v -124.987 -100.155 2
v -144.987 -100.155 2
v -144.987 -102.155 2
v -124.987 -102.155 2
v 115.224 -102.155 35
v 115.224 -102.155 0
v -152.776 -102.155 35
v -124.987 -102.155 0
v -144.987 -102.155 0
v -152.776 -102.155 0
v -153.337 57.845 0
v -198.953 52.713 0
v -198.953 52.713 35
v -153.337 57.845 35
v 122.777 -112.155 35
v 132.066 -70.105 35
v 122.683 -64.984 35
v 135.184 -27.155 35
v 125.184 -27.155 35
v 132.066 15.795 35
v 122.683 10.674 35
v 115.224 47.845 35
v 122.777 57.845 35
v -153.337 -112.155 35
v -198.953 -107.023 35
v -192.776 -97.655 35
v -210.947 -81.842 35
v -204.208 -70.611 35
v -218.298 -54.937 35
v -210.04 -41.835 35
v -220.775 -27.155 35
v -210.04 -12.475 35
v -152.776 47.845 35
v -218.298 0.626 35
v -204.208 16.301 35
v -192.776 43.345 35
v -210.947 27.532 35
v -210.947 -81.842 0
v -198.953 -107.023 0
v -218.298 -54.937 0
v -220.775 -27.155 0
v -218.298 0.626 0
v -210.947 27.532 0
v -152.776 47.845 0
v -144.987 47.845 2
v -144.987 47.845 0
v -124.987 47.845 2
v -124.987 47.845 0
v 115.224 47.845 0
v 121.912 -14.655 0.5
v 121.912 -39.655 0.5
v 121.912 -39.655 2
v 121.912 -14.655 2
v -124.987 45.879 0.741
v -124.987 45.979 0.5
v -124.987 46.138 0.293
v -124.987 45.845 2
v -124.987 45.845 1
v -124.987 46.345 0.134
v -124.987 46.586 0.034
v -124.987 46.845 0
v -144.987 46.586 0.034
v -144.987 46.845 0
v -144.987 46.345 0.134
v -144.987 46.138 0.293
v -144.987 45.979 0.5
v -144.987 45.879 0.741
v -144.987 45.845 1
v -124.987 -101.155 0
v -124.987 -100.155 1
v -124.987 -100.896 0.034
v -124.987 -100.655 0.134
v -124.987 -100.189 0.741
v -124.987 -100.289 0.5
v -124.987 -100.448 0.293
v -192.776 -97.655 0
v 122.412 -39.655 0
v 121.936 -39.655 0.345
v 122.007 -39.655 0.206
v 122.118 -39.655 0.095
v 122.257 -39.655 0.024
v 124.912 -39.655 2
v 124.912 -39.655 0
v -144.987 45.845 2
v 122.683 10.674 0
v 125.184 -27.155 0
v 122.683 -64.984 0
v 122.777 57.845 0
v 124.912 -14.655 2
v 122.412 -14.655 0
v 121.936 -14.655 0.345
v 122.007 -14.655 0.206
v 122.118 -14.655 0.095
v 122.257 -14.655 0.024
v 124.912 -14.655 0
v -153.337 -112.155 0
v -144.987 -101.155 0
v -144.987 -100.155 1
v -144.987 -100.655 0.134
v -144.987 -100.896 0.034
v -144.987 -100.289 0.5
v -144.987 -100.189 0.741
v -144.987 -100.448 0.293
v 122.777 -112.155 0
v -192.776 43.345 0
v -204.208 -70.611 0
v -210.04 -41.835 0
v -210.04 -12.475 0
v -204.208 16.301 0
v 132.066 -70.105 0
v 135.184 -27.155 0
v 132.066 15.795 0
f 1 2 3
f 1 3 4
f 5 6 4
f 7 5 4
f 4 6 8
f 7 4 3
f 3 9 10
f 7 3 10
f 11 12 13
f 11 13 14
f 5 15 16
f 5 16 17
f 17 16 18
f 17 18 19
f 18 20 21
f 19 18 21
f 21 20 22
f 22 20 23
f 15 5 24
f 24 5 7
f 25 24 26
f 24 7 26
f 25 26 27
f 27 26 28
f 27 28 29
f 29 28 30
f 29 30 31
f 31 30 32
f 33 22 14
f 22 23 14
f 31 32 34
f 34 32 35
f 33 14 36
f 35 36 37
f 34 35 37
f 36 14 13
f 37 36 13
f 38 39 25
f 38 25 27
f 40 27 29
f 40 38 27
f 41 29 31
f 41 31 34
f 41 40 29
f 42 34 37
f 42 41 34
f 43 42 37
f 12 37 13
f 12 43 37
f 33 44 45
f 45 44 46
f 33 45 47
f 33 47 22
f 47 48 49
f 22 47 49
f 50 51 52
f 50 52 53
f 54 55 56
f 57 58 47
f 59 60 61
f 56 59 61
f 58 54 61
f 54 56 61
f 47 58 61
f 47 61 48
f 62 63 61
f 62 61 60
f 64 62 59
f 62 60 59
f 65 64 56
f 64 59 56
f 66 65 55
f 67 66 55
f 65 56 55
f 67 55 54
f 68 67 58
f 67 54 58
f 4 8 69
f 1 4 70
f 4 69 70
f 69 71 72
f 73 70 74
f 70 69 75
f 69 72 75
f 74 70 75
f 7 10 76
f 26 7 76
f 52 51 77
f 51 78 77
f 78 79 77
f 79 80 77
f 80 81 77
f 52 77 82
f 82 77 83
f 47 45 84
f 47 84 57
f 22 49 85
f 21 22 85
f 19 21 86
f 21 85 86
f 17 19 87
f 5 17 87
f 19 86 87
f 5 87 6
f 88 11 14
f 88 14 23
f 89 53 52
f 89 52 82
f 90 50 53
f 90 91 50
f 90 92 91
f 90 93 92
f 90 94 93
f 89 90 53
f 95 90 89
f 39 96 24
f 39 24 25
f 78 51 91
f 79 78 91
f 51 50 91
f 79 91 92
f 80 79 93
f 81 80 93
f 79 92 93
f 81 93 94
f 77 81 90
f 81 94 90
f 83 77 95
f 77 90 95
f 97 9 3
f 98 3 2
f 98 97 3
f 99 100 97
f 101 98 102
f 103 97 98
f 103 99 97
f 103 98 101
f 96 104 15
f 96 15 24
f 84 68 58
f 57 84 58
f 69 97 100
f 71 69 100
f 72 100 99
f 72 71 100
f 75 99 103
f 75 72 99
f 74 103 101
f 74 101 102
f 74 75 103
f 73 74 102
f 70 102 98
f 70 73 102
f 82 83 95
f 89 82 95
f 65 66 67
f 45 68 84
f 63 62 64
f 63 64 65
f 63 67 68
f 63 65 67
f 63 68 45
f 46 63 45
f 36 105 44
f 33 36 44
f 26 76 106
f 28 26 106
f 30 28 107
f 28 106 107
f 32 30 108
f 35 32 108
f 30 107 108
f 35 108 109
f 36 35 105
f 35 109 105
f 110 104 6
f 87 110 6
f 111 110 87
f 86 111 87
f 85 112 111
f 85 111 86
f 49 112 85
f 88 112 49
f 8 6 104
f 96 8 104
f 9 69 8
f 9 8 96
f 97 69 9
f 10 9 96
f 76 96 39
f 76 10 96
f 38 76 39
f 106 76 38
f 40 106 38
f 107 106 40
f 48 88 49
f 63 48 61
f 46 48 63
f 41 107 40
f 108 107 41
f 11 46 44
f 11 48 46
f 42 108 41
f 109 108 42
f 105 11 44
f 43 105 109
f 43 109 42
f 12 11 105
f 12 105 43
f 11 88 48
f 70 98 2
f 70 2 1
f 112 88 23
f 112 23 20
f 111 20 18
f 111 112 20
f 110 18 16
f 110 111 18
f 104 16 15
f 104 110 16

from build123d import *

# Parameters (mm, degrees)
EXTRU_MINCE1_DEPTH = 35
ESQUISSE1_13_W     = 3
ESQUISSE1_13_H     = 25
BOSS_EXTRU_1_DEPTH = 2
ESQUISSE1_14_W     = 20
ESQUISSE1_14_H     = 2
BOSS_EXTRU_2_DEPTH = 2
ESQUISSE1_15_W     = 20
ESQUISSE1_15_H     = 2
BOSS_EXTRU_3_DEPTH = 2
CONG_2_R           = 1
CONG_3_R           = 1
CONG_4_R           = 0.5


with BuildPart() as part:
    # Esquisse1 → Extru.-Mince1 (new body)
    with BuildSketch(Plane.XY):
        with BuildLine():
            Line((-198.953146912, 52.713133275), (-153.336718001, 57.844981528))
            Line((-153.336718001, 57.844981528), (122.776592962, 57.844981528))
            ThreePointArc((122.776592962, 57.844981528), (135.183889941, -27.155018472), (122.776592962, -112.155018472))
            Line((122.776592962, -112.155018472), (-153.336718001, -112.155018472))
            Line((-153.336718001, -112.155018472), (-198.953146912, -107.02317022))
            ThreePointArc((-198.953146912, -107.02317022), (-220.774609776, -27.155018472), (-198.953146912, 52.713133275))
        make_face()
        with BuildLine():
            Line((-192.775986612, 43.344981528), (-152.775986612, 47.844981528))
            Line((-152.775986612, 47.844981528), (115.224013388, 47.844981528))
            ThreePointArc((115.224013388, 47.844981528), (125.183889941, -27.155018472), (115.224013388, -102.155018472))
            Line((115.224013388, -102.155018472), (-152.775986612, -102.155018472))
            Line((-152.775986612, -102.155018472), (-192.775986612, -97.655018472))
            ThreePointArc((-192.775986612, -97.655018472), (-210.774609776, -27.155018472), (-192.775986612, 43.344981528))
        make_face(mode=Mode.SUBTRACT)
    extrude(amount=EXTRU_MINCE1_DEPTH)

    # Esquisse1<14> → Boss.-Extru.2 (add)
    with BuildSketch(Plane.XY):
        with Locations((-134.987389646, -101.155018472)):
            Rectangle(ESQUISSE1_14_W, ESQUISSE1_14_H)
    extrude(amount=BOSS_EXTRU_2_DEPTH)

    # Esquisse1<15> → Boss.-Extru.3 (add)
    with BuildSketch(Plane.XY):
        with Locations((-134.987389646, 46.844981528)):
            Rectangle(ESQUISSE1_15_W, ESQUISSE1_15_H)
    extrude(amount=BOSS_EXTRU_3_DEPTH)

    # Congé2
    cong_2_edges = [part.edges().sort_by_distance(p)[0] for p in [
        (-134.987389646, 45.844981528, 0),
    ]]
    fillet(cong_2_edges, radius=CONG_2_R)

    # Congé3
    cong_3_edges = [part.edges().sort_by_distance(p)[0] for p in [
        (-134.987389646, -100.155018472, 0),
    ]]
    fillet(cong_3_edges, radius=CONG_3_R)


with BuildPart() as body_2:
    # Esquisse1<13> → Boss.-Extru.1 (new body)
    with BuildSketch(Plane.XY):
        with Locations((123.411892491, -27.155018472)):
            Rectangle(ESQUISSE1_13_W, ESQUISSE1_13_H)
    extrude(amount=BOSS_EXTRU_1_DEPTH)

    # Congé4
    cong_4_edges = [body_2.edges().sort_by_distance(p)[0] for p in [
        (121.911892491, -27.155018472, 0),
    ]]
    fillet(cong_4_edges, radius=CONG_4_R)


solid = Compound([part.part, body_2.part])
